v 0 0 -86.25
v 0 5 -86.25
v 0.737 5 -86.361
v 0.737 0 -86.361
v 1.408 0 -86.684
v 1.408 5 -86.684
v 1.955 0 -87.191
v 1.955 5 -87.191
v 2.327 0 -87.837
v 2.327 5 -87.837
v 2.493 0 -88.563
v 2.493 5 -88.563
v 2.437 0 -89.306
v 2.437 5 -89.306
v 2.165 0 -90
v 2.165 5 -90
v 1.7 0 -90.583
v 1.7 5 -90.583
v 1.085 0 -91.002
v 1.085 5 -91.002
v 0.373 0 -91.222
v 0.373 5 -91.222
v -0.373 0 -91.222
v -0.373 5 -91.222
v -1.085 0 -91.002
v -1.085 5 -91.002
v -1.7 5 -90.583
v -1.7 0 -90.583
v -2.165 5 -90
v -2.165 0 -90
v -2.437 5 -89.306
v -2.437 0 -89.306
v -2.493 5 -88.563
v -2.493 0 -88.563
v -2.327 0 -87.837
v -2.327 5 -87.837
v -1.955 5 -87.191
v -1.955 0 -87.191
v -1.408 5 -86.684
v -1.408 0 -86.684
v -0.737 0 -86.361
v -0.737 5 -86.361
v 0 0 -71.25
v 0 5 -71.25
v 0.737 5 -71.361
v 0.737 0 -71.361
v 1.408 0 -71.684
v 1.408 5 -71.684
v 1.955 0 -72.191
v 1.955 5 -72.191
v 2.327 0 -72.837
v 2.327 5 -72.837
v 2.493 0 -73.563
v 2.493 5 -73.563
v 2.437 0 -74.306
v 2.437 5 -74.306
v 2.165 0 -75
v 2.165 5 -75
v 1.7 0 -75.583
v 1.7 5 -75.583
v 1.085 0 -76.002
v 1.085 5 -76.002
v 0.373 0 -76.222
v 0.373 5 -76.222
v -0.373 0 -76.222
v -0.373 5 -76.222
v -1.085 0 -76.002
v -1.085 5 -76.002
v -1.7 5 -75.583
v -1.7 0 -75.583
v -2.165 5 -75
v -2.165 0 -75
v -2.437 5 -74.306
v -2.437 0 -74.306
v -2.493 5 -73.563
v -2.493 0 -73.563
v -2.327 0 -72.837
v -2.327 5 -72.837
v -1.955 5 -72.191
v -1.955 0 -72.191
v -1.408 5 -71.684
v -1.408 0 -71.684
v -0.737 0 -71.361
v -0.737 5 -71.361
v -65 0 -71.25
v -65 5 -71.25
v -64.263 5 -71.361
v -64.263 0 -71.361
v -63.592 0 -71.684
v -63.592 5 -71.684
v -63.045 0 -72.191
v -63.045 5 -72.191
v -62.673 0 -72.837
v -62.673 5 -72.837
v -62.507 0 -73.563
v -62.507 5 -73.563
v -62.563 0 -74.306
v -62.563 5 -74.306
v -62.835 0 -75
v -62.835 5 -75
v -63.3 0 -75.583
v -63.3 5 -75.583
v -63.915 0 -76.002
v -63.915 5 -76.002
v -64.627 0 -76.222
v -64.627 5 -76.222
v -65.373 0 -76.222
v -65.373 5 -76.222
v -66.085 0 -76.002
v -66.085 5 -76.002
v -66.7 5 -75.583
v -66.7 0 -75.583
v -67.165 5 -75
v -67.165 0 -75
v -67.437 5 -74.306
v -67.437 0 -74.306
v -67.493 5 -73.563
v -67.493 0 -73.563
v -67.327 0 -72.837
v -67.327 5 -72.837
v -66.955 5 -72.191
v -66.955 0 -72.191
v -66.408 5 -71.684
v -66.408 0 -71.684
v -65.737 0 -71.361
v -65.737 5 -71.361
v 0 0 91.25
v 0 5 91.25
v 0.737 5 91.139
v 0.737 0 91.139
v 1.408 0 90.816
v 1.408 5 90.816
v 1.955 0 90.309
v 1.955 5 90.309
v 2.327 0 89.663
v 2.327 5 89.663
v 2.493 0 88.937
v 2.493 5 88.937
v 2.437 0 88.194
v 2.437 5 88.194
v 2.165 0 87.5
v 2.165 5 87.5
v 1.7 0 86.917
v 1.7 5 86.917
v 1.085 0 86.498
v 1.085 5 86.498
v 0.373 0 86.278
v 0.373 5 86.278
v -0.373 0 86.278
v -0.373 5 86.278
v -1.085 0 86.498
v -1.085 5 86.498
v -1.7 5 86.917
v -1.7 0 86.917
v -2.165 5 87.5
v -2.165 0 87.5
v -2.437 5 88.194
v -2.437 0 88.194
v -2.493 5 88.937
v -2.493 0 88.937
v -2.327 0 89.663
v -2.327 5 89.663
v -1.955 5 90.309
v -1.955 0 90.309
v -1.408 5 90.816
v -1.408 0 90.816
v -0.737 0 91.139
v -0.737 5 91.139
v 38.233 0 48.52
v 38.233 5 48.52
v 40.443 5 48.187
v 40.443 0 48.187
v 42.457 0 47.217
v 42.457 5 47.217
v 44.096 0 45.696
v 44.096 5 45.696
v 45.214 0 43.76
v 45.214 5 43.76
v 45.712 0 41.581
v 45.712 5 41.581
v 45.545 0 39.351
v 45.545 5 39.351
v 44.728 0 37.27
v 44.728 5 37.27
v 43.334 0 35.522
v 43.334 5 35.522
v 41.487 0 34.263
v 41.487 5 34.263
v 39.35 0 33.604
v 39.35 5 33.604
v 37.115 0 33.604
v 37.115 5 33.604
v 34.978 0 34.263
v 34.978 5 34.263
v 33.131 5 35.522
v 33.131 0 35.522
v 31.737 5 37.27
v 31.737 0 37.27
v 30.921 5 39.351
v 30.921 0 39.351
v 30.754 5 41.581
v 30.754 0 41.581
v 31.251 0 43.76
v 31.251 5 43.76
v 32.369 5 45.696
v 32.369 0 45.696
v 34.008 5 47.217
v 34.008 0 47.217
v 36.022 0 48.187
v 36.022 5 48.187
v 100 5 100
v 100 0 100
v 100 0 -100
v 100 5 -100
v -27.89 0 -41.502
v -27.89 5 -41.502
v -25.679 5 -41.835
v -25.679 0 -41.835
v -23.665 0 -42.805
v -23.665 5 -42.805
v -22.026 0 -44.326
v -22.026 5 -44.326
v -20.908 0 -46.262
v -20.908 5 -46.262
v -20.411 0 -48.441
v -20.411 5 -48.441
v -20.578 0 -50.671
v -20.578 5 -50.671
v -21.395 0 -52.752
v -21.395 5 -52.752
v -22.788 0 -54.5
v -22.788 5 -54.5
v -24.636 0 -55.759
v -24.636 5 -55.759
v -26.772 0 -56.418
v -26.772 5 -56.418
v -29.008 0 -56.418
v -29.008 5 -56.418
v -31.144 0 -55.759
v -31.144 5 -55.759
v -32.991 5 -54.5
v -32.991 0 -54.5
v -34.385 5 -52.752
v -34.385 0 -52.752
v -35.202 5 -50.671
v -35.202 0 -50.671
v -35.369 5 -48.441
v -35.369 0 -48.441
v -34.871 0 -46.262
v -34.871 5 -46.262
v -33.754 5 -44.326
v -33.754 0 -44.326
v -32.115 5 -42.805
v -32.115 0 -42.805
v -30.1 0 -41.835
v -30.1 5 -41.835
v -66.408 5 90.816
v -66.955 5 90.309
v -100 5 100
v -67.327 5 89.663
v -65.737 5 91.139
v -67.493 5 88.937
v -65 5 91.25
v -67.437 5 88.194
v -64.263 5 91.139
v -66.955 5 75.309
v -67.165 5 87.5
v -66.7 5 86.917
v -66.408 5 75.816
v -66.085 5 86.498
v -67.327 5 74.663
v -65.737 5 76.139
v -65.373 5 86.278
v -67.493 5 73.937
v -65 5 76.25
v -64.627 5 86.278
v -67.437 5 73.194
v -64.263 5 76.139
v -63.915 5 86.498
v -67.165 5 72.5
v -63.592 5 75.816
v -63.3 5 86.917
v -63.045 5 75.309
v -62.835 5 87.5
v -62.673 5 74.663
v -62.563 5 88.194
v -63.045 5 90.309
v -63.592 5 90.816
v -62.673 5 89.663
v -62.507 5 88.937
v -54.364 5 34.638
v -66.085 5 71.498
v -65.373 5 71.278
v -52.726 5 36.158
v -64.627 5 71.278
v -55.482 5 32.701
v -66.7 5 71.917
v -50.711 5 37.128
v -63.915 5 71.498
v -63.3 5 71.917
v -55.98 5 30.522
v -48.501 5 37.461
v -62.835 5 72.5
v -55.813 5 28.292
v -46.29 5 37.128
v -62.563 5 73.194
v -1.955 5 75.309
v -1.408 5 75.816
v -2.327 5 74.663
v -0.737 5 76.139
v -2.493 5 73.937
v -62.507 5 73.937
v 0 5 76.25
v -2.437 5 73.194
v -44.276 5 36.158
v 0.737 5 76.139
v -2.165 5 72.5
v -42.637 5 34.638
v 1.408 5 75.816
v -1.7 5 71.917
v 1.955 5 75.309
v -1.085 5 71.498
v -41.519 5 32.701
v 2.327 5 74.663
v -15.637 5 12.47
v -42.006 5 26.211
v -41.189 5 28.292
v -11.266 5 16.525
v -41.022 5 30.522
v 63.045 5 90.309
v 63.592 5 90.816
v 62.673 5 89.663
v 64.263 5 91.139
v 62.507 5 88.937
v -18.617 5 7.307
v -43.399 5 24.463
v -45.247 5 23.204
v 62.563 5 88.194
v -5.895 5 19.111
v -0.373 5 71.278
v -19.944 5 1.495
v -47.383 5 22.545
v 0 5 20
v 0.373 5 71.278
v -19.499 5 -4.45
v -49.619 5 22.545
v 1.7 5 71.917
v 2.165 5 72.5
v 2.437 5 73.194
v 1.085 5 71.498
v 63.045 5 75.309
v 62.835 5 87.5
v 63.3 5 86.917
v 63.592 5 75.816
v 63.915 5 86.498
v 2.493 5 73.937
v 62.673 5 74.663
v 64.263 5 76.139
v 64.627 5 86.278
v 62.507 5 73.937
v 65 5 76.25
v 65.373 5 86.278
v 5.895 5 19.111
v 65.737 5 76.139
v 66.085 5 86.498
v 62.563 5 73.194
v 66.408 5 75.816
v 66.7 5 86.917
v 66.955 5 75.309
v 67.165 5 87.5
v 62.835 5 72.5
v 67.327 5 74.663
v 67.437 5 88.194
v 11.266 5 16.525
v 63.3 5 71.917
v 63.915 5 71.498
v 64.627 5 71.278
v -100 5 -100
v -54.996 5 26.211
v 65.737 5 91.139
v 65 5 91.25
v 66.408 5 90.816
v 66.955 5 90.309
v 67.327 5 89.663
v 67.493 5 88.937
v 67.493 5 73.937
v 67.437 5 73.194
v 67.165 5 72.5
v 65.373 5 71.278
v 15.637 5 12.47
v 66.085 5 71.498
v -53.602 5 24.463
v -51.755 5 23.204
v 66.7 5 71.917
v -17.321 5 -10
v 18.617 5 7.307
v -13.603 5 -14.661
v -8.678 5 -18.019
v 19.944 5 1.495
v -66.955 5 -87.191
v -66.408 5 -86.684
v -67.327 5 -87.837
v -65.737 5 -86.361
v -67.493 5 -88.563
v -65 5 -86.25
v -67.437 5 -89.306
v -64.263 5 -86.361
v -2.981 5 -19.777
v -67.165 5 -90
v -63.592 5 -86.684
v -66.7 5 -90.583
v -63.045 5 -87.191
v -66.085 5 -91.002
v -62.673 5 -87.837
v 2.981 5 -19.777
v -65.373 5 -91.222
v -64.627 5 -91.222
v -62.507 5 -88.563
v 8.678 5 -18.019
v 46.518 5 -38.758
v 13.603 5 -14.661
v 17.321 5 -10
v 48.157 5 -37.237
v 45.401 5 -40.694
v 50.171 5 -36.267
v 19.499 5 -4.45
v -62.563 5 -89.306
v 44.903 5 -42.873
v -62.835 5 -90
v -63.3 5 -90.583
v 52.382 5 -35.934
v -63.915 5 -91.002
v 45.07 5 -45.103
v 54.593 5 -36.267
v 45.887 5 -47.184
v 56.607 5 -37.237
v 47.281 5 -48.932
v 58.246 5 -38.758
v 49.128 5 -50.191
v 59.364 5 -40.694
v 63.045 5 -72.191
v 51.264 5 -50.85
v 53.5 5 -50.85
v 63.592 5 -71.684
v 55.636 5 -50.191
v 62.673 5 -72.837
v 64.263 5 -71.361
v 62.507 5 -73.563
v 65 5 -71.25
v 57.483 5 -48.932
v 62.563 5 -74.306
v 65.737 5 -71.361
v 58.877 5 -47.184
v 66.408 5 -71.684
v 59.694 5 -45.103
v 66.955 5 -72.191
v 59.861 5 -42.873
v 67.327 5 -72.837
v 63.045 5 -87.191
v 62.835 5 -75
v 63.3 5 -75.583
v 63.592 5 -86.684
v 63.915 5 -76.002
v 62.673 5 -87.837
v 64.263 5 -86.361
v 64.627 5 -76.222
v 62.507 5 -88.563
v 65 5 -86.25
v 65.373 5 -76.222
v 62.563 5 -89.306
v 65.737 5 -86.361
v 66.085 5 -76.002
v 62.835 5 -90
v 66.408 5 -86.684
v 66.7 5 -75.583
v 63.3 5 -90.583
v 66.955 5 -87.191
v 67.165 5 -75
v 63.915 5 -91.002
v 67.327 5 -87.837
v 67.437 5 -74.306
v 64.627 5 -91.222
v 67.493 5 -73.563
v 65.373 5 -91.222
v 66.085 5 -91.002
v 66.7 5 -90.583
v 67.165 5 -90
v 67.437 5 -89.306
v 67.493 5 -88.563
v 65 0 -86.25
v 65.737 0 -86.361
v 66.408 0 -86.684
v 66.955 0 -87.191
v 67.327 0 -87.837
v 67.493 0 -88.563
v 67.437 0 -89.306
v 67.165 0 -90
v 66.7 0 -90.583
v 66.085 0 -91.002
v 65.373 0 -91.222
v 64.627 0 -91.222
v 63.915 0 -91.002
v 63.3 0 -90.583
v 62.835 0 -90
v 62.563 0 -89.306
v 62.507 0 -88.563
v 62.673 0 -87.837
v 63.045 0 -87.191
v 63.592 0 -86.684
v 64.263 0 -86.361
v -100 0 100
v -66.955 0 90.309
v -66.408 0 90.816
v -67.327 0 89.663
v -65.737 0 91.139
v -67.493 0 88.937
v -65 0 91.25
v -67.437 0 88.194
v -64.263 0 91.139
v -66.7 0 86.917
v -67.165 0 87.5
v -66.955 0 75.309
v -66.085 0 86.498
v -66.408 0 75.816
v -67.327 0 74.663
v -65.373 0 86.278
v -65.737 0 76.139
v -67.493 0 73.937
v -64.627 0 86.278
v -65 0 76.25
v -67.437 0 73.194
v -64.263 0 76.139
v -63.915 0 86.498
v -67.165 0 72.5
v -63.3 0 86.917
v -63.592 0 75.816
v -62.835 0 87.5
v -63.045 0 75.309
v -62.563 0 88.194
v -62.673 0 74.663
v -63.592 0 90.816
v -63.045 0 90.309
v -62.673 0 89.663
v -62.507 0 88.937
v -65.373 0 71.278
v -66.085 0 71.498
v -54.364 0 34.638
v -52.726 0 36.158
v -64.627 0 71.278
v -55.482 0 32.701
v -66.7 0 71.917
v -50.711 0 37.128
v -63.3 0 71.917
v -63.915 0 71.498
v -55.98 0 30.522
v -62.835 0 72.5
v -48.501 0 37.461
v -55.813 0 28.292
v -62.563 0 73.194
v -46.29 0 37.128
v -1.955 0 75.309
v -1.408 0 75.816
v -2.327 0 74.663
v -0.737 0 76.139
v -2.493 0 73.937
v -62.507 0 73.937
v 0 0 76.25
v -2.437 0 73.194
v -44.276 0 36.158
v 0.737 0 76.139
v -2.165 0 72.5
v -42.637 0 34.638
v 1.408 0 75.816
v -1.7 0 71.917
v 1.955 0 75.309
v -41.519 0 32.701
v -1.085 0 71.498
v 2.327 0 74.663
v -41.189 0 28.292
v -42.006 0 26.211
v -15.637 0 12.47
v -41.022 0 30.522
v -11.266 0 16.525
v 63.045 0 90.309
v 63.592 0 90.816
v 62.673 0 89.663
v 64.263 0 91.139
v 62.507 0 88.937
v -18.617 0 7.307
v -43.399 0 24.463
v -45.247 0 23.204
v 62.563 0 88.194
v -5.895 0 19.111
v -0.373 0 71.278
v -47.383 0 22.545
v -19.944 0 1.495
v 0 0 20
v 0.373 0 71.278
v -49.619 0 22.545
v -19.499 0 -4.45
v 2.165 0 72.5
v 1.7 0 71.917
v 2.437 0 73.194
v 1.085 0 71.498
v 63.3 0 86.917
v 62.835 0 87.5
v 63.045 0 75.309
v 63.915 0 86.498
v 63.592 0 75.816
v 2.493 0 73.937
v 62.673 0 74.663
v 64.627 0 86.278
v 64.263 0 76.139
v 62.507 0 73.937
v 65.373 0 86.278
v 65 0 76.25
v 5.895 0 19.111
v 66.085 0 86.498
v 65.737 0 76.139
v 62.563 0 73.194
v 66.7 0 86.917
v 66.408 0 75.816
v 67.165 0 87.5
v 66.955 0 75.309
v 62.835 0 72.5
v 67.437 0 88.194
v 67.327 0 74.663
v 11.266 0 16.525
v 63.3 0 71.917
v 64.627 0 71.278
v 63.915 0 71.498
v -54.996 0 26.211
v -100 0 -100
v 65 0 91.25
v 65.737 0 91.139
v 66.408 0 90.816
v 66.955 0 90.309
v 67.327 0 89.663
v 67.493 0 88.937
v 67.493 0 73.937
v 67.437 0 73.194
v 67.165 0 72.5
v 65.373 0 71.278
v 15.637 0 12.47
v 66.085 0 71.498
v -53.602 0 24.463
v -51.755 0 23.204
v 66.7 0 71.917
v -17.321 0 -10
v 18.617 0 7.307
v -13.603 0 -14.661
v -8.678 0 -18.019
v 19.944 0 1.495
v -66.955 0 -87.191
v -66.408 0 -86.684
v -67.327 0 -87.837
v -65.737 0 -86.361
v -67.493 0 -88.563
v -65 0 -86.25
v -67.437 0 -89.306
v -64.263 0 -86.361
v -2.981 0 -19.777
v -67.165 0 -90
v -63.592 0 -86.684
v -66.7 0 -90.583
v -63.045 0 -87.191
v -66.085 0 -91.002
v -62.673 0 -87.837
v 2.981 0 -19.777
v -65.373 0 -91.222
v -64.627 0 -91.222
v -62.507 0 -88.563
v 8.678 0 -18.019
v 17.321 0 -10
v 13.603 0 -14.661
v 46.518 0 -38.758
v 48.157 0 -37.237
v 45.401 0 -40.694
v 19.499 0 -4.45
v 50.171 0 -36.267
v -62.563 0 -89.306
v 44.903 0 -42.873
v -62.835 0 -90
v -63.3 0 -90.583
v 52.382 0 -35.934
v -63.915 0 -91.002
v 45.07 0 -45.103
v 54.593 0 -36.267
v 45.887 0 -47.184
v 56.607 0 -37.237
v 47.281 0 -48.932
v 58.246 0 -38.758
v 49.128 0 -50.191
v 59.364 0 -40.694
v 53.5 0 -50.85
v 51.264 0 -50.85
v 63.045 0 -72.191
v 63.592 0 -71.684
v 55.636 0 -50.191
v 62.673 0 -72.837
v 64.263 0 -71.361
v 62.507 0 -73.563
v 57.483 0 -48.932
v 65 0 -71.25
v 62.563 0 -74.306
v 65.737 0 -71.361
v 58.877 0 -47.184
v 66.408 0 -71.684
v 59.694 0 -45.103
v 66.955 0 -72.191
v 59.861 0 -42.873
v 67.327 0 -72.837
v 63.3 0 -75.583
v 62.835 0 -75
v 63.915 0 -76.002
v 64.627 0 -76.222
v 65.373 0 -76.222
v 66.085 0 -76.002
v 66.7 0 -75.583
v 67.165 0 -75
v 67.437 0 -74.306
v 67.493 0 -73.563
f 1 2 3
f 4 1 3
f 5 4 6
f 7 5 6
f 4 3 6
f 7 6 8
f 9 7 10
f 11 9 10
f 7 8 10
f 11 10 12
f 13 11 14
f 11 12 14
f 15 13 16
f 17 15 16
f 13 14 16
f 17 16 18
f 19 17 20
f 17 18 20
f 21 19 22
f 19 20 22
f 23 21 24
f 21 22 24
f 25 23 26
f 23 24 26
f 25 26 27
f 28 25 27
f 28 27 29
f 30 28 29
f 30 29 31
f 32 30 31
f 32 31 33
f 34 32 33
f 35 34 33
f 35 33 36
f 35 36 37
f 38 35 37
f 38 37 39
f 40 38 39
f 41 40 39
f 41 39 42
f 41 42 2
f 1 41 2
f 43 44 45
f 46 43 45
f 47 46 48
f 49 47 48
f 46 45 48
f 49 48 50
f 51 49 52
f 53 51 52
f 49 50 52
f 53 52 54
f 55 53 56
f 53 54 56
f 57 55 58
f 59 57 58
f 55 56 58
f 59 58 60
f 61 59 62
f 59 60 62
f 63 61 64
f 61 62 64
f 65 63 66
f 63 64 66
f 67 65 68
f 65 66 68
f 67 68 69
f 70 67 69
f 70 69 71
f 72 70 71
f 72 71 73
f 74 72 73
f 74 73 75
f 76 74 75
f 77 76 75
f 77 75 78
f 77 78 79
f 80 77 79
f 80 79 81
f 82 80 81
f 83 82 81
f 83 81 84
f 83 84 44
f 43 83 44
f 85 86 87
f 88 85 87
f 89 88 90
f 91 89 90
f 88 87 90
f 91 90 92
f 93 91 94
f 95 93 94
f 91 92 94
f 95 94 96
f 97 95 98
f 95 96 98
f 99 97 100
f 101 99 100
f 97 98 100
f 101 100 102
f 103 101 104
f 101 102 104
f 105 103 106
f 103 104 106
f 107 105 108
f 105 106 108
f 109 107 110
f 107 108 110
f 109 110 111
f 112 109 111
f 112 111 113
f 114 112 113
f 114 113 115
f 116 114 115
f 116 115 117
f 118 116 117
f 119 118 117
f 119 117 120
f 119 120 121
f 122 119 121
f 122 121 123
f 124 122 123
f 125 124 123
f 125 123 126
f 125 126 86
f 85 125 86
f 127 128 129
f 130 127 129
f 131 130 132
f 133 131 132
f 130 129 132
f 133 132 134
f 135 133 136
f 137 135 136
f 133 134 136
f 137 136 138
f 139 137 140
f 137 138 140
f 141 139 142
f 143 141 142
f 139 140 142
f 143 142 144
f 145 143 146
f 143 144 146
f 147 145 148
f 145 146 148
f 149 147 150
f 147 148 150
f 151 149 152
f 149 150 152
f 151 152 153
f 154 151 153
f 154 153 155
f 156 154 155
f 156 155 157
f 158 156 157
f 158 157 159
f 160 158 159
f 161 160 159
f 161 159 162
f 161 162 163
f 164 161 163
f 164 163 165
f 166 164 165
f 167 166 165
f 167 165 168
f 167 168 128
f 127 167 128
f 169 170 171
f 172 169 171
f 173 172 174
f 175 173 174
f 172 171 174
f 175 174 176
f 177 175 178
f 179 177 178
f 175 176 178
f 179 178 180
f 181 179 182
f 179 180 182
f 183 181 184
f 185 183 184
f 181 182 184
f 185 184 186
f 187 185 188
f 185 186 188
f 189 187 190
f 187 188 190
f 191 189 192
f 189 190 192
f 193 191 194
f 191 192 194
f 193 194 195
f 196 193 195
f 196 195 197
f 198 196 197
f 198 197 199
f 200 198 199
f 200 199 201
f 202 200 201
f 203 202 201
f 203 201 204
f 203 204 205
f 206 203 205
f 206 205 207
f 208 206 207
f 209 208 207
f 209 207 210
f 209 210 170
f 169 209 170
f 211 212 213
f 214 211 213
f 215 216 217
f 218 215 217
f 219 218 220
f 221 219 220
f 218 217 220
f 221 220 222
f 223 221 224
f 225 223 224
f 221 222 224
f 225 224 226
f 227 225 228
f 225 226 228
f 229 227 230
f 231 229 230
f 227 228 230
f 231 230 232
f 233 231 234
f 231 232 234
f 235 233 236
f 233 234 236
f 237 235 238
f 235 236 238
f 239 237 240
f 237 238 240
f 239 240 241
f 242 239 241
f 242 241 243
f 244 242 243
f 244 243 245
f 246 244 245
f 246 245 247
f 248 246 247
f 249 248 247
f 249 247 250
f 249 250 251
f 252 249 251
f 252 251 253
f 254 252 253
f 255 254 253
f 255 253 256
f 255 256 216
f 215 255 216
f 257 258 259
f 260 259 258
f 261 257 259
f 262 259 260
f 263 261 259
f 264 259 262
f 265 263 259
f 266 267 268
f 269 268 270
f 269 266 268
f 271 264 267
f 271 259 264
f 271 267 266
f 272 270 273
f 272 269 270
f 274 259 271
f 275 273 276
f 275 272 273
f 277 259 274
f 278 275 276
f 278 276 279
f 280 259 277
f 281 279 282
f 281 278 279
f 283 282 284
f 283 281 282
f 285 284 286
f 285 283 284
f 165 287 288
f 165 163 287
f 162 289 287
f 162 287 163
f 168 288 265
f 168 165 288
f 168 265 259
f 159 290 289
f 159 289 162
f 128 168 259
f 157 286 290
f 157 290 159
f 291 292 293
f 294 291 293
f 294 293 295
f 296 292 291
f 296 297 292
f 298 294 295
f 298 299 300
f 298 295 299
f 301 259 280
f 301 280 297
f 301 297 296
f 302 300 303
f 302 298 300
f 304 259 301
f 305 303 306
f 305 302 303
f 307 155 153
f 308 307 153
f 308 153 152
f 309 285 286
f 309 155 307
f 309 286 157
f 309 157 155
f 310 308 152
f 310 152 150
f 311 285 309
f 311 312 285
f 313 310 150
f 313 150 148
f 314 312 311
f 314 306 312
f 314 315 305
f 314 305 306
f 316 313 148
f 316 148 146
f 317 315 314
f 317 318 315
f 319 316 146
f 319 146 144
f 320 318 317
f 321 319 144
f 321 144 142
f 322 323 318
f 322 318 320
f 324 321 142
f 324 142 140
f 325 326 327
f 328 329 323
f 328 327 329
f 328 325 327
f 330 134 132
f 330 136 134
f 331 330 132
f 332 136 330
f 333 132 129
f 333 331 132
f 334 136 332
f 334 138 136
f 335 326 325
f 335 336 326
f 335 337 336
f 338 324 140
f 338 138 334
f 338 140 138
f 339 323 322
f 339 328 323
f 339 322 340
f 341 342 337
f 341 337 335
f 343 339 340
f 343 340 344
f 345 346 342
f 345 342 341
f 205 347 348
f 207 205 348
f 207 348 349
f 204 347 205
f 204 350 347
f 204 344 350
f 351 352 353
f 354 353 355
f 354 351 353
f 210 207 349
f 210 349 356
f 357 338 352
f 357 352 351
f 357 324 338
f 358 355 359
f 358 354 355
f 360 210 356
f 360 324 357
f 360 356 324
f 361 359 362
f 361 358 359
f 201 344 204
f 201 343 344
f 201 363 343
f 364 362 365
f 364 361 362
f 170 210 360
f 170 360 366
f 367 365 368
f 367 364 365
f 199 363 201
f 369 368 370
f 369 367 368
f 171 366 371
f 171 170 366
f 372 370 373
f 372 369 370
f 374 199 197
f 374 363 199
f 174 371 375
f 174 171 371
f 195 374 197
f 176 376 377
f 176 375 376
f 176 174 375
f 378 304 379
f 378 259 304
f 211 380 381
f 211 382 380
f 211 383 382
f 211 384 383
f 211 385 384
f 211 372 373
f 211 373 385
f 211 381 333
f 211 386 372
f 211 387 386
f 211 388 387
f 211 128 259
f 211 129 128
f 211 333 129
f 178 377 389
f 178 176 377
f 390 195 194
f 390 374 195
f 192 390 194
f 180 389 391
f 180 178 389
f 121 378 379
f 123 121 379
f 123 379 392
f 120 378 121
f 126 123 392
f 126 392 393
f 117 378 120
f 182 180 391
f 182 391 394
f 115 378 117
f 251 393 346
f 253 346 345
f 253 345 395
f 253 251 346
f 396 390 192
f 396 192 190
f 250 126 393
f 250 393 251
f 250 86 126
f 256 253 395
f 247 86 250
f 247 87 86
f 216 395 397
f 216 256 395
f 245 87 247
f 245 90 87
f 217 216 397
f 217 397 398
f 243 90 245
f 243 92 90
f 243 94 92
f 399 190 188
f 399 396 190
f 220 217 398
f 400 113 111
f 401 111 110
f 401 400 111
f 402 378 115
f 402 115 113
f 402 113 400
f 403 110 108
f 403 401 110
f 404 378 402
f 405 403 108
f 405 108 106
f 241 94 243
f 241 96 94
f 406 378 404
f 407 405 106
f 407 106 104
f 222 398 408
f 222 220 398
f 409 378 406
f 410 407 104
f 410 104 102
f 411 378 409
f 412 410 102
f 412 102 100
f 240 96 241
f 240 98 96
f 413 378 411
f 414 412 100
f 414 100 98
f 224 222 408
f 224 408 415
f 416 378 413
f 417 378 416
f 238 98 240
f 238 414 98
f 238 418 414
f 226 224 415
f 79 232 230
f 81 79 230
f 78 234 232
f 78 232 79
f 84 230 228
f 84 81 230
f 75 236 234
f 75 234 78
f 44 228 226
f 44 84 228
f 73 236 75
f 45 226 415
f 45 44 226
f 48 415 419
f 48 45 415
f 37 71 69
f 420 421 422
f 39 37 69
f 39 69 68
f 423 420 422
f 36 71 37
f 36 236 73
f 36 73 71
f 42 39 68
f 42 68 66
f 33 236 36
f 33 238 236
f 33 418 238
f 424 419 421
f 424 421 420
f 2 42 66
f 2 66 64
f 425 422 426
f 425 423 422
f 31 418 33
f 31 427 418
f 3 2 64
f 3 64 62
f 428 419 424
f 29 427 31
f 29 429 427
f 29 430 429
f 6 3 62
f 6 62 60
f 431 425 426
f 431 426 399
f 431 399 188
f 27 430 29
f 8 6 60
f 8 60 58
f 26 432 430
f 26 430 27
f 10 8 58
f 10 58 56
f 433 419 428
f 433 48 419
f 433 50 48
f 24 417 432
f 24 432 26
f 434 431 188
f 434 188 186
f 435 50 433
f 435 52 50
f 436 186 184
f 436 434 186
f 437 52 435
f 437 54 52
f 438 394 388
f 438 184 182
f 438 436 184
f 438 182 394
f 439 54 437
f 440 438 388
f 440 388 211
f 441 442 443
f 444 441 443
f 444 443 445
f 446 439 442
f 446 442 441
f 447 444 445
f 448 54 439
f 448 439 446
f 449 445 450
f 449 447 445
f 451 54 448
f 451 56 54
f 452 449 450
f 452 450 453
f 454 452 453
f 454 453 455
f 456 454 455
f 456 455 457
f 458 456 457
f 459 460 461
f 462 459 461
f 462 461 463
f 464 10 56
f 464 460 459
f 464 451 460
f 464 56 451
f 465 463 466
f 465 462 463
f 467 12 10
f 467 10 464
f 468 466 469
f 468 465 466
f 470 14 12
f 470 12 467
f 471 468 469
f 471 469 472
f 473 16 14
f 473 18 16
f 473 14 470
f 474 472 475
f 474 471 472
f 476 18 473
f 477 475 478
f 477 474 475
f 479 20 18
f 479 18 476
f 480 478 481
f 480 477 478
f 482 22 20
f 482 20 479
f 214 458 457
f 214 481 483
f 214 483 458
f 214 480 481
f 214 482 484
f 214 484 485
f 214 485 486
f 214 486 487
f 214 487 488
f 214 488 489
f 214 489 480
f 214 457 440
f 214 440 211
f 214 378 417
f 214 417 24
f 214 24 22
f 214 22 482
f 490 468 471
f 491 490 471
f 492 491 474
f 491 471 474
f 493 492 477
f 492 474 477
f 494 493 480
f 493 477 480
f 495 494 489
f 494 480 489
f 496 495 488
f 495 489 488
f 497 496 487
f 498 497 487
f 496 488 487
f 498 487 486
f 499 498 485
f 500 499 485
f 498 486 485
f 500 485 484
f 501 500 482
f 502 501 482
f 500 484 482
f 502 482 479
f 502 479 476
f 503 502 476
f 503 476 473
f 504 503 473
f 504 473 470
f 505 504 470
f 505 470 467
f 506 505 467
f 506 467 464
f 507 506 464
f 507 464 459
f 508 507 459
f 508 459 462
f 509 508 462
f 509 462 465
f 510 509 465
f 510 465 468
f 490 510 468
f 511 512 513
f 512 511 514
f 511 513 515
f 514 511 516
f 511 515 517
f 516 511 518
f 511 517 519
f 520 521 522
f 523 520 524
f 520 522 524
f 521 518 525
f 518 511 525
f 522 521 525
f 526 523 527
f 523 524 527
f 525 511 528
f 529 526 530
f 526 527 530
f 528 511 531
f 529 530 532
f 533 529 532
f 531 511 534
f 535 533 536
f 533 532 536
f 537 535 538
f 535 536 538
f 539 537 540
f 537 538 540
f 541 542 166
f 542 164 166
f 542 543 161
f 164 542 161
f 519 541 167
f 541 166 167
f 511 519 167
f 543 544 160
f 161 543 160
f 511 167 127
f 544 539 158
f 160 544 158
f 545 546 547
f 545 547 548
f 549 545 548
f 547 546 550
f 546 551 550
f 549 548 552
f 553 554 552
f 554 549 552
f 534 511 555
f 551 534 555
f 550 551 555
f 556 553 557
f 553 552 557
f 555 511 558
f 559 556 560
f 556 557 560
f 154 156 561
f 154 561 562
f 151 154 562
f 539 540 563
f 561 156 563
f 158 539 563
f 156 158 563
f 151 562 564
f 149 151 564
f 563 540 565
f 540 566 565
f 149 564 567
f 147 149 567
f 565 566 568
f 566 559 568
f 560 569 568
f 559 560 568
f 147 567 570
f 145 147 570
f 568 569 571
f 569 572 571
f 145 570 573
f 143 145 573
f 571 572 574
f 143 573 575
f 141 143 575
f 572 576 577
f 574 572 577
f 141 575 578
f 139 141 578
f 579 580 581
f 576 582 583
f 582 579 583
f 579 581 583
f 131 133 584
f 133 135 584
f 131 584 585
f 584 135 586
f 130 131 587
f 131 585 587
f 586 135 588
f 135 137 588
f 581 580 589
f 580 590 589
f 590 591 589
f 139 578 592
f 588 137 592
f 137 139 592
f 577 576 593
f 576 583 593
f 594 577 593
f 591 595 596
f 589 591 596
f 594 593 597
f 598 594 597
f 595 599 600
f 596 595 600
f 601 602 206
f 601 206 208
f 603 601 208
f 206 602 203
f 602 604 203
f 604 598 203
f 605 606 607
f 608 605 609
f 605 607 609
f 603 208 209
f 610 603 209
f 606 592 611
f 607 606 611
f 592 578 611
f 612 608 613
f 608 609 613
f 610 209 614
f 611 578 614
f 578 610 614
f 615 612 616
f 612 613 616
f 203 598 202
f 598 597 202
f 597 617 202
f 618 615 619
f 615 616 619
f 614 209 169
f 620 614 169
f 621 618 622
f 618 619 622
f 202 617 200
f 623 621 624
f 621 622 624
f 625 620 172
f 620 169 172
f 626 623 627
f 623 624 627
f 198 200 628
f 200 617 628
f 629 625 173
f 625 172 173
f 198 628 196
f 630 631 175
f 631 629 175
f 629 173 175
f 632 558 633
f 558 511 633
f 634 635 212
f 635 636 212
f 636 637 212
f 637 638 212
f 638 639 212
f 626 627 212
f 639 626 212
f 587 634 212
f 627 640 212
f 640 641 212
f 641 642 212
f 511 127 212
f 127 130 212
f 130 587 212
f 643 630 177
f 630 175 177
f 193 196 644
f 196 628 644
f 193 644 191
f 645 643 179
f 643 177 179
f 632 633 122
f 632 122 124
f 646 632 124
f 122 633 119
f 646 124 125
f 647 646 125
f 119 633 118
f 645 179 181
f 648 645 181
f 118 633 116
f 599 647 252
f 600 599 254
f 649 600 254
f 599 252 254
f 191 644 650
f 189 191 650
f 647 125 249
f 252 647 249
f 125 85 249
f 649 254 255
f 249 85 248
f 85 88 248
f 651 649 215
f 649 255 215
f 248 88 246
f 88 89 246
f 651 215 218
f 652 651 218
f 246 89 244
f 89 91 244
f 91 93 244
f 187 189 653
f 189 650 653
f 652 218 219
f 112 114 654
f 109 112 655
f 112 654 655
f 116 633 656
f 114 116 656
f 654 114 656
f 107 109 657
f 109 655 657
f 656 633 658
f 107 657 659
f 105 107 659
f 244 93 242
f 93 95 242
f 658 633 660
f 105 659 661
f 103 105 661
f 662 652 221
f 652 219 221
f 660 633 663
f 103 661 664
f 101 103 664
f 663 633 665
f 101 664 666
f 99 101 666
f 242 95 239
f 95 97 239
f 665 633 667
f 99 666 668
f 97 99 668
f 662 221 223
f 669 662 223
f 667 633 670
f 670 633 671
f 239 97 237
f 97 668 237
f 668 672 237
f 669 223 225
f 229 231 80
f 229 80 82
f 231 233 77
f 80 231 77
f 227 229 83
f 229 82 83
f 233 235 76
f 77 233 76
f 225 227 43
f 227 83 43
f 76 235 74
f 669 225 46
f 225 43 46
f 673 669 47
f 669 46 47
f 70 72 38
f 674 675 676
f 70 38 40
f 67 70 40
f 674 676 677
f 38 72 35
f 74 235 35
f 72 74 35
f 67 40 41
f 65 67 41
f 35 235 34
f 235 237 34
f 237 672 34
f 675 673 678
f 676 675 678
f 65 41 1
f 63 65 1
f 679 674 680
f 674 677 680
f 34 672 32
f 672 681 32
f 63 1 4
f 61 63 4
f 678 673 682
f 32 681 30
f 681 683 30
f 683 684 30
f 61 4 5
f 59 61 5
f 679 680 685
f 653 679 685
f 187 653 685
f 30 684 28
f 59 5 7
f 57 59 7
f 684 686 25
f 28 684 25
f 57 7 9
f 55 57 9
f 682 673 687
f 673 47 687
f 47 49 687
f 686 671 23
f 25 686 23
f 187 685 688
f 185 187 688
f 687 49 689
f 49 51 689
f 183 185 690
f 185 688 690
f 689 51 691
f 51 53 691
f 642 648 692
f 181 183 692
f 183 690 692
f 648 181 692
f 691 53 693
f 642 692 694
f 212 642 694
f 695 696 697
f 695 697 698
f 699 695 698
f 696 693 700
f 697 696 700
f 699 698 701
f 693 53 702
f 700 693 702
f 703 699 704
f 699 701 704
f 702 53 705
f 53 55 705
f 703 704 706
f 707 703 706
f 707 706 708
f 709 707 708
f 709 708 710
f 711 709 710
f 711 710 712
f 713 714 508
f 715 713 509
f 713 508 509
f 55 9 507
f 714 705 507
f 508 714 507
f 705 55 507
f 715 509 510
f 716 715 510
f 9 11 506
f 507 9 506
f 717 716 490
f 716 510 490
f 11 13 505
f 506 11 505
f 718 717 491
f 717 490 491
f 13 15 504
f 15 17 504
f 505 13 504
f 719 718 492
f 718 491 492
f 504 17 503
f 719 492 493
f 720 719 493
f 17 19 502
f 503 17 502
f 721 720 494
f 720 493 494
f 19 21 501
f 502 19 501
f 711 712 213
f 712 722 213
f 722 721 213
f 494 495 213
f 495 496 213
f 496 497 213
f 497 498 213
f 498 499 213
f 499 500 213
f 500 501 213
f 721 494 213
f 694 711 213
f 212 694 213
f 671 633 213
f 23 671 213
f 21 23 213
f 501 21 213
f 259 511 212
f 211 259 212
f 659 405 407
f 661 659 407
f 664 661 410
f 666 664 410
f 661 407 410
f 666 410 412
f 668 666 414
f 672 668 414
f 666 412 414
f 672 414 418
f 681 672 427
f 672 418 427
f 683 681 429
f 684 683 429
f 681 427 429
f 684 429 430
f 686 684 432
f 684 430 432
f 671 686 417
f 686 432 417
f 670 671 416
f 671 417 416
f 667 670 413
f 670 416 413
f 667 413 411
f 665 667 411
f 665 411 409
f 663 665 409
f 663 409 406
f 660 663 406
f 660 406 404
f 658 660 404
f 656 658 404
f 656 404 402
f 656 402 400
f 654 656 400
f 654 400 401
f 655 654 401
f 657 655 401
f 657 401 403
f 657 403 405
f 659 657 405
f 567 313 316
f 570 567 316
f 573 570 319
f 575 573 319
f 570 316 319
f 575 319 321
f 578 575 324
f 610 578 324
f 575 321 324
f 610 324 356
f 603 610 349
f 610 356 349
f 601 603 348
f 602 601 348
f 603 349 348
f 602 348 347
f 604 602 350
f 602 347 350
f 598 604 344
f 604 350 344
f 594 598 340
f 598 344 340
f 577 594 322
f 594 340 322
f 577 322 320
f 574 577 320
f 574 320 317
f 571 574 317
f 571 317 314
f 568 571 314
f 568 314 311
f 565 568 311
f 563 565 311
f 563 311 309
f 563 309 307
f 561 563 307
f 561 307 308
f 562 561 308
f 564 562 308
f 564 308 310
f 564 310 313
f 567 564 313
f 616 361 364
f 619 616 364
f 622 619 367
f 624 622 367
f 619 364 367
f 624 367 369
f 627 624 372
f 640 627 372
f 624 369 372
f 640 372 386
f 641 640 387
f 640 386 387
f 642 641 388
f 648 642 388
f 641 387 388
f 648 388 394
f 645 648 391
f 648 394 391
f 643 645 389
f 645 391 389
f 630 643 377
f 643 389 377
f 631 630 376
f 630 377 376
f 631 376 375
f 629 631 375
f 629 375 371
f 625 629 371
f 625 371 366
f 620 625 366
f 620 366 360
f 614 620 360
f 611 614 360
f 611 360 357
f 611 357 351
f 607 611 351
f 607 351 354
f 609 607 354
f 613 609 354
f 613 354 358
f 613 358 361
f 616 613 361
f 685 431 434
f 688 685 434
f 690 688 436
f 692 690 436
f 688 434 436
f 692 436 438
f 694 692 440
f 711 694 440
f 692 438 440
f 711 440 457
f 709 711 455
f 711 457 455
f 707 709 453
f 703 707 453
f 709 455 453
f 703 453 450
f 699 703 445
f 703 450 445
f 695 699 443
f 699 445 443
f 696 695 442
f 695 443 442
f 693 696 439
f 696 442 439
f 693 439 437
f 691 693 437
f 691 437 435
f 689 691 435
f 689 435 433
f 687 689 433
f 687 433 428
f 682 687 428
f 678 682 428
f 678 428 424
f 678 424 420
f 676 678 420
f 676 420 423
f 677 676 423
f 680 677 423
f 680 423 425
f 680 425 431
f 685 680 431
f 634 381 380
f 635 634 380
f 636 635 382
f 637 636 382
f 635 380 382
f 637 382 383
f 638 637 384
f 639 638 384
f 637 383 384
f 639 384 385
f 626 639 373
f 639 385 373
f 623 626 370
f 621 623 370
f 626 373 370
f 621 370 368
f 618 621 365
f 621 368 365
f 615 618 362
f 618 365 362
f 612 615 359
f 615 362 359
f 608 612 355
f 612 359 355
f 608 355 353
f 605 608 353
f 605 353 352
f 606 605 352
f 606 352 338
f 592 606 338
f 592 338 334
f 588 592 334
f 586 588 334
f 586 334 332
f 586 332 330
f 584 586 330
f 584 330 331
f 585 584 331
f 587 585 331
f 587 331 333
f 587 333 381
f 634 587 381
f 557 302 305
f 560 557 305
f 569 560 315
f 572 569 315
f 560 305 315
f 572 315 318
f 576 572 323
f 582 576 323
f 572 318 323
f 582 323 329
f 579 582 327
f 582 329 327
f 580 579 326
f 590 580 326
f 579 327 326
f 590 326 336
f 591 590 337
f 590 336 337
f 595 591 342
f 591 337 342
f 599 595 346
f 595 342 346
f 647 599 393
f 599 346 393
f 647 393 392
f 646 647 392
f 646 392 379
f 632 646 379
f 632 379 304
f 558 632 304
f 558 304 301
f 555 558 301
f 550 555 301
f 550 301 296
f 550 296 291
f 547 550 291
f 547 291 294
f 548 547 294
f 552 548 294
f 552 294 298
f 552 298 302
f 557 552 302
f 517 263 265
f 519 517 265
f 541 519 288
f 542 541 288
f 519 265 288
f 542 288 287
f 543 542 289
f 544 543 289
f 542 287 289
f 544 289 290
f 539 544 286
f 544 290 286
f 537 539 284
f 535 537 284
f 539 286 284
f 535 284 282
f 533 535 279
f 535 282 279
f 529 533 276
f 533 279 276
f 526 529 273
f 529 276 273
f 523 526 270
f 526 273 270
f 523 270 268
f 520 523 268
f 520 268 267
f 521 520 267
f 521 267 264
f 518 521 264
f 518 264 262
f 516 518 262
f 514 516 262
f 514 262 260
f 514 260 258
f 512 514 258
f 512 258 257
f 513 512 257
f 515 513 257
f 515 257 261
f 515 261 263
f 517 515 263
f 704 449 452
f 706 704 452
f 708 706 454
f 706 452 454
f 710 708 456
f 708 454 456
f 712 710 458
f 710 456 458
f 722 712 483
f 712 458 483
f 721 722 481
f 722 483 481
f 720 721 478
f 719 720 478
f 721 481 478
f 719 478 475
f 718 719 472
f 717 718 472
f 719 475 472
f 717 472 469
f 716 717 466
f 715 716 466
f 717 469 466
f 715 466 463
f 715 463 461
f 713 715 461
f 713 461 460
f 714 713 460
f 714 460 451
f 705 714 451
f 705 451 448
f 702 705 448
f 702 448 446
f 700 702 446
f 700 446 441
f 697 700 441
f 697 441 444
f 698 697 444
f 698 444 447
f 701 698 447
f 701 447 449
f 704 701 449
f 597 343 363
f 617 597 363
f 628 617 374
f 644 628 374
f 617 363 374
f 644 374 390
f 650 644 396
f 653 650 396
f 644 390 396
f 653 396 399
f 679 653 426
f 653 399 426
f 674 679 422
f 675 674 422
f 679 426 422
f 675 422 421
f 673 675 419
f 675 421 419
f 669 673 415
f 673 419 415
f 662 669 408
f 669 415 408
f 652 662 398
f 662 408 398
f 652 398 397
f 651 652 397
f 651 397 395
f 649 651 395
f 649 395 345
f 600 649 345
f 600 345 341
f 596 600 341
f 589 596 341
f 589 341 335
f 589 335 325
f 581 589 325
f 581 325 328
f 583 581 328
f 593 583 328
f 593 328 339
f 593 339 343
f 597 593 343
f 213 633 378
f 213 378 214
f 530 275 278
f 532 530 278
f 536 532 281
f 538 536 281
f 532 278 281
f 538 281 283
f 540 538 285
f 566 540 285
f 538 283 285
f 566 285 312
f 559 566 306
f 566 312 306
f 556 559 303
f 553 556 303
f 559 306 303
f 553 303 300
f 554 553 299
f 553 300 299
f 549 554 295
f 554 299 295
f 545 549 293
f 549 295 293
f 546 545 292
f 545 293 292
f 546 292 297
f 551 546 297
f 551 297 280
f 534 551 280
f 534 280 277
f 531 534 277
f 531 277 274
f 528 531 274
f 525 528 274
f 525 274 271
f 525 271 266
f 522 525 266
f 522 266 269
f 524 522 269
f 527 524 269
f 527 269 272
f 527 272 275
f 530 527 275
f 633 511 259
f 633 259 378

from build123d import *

# Parameters (mm, degrees)
SKETCH2_W              = 200
SKETCH2_H              = 200
BOSS_EXTRUDE1_DEPTH    = 5
SKETCH3_W              = 5
SKETCH3_H              = 30
BOSS_EXTRUDE2_DEPTH    = 60
CUT_EXTRUDE1_REACH     = 189.75
SKETCH4_R              = 5
FILLET1_R              = 10
LPATTERN1_COUNT        = 3
LPATTERN1_PITCH        = 57.5
LPATTERN1_COUNT_DIR2   = 2
LPATTERN1_PITCH_DIR2   = 136.25
FILLET1_OF_LPATTERN1_R = 10
SKETCH6_R              = 20
CUT_EXTRUDE3_DEPTH     = 154.622914957
SKETCH10_R             = 2.5
CUT_EXTRUDE4_DEPTH     = 154.622914957
LPATTERN2_COUNT        = 3
LPATTERN2_PITCH        = 65
LPATTERN2_COUNT_DIR2   = 2
LPATTERN2_PITCH_DIR2   = 162.5
SKETCH11_W             = 200
SKETCH11_H             = 200
CUT_EXTRUDE5_DEPTH     = 154.622914957
SKETCH12_R             = 7.5
CUT_EXTRUDE6_DEPTH     = 142.509716981


with BuildPart() as part:
    # Sketch2 → Boss-Extrude1 (new body)
    with BuildSketch(Plane(origin=(0, 0, 0), x_dir=(1, 0, 0), z_dir=(0, 1, 0))):
        Rectangle(SKETCH2_W, SKETCH2_H)
    extrude(amount=BOSS_EXTRUDE1_DEPTH)

    # Sketch3 → Boss-Extrude2 (add)
    with BuildSketch(Plane(origin=(0, 5, 0), x_dir=(1, 0, 0), z_dir=(0, 1, 0))):
        with Locations((-82.5, 81.25)):
            Rectangle(SKETCH3_W, SKETCH3_H)
        with Locations((-47.5, 81.25)):
            Rectangle(SKETCH3_W, SKETCH3_H)
    boss_extrude2 = extrude(amount=BOSS_EXTRUDE2_DEPTH)

    # Cut-Extrude1: up to this face of the body (flat: up to its plane)
    cut_extrude1_end = Plane(part.part.faces().sort_by_distance((-85, 35, -81.25))[0])
    # Sketch4 → Cut-Extrude1 (cut, up to the picked face)
    with BuildSketch(Plane(origin=(-45, 0, 0), x_dir=(0, 0, -1), z_dir=(1, 0, 0)), mode=Mode.PRIVATE) as cut_extrude1_sk1:
        with Locations((81.25, 55)):
            Circle(SKETCH4_R)
    cut_extrude1_tool1 = split(extrude(cut_extrude1_sk1.sketch, amount=-CUT_EXTRUDE1_REACH, mode=Mode.PRIVATE), bisect_by=cut_extrude1_end, keep=Keep.BOTH, mode=Mode.PRIVATE)
    cut_extrude1 = cut_extrude1_tool1.solids().sort_by(Axis((-45, 55, -81.25), (-1, 0, 0)))[0]
    add(cut_extrude1, mode=Mode.SUBTRACT)

    # Fillet1
    fillet1_edges = [part.edges().sort_by_distance(p)[0] for p in [
        (-82.5, 65, -96.25),
        (-82.5, 65, -66.25),
        (-47.5, 65, -96.25),
        (-47.5, 65, -66.25),
    ]]
    fillet(fillet1_edges, radius=FILLET1_R)

    # LPattern1: Boss-Extrude2, Cut-Extrude1 3 × 2
    with Locations(*[(i * LPATTERN1_PITCH, 0, j * LPATTERN1_PITCH_DIR2) for i in range(LPATTERN1_COUNT) for j in range(LPATTERN1_COUNT_DIR2) if (i, j) != (0, 0)]):
        add(boss_extrude2)
        add(cut_extrude1, mode=Mode.SUBTRACT)

    # Fillet1 of LPattern1
    fillet1_of_lpattern1_edges = [part.edges().sort_by_distance(p)[0] for p in [
        (-82.5, 65, 40),
        (-82.5, 65, 70),
        (-47.5, 65, 40),
        (-47.5, 65, 70),
        (-25, 65, -96.25),
        (-25, 65, -66.25),
        (10, 65, -96.25),
        (10, 65, -66.25),
        (-25, 65, 40),
        (-25, 65, 70),
        (10, 65, 40),
        (10, 65, 70),
        (32.5, 65, -96.25),
        (32.5, 65, -66.25),
        (67.5, 65, -96.25),
        (67.5, 65, -66.25),
        (32.5, 65, 40),
        (32.5, 65, 70),
        (67.5, 65, 40),
        (67.5, 65, 70),
    ]]
    fillet(fillet1_of_lpattern1_edges, radius=FILLET1_OF_LPATTERN1_R)

    # Sketch6 → Cut-Extrude3 (cut, through all)
    with BuildSketch(Plane(origin=(0, 5, 0), x_dir=(1, 0, 0), z_dir=(0, 1, 0))):
        with Locations(Location((0, 0, 0), (0, 0, 270))):
            Circle(SKETCH6_R)
    extrude(amount=-CUT_EXTRUDE3_DEPTH, mode=Mode.SUBTRACT)

    # Sketch10 → Cut-Extrude4 (cut, through all)
    with BuildSketch(Plane(origin=(0, 5, 0), x_dir=(1, 0, 0), z_dir=(0, 1, 0))):
        with Locations(Location((-65, 88.75, 0), (0, 0, 270))):
            Circle(SKETCH10_R)
        with Locations(Location((-65, 73.75, 0), (0, 0, 270))):
            Circle(SKETCH10_R)
    cut_extrude4 = extrude(amount=-CUT_EXTRUDE4_DEPTH, mode=Mode.SUBTRACT)

    # LPattern2: Cut-Extrude4 3 × 2
    with Locations(*[(i * LPATTERN2_PITCH, 0, j * LPATTERN2_PITCH_DIR2) for i in range(LPATTERN2_COUNT) for j in range(LPATTERN2_COUNT_DIR2) if (i, j) != (0, 0)]):
        add(cut_extrude4, mode=Mode.SUBTRACT)

    # Sketch11 → Cut-Extrude5 (cut, through all)
    with BuildSketch(Plane(origin=(0, 5, 0), x_dir=(1, 0, 0), z_dir=(0, 1, 0))):
        Rectangle(SKETCH11_W, SKETCH11_H)
    extrude(amount=CUT_EXTRUDE5_DEPTH, mode=Mode.SUBTRACT)

    # Sketch12 → Cut-Extrude6 (cut, through all)
    with BuildSketch(Plane(origin=(0, 5, 0), x_dir=(1, 0, 0), z_dir=(0, 1, 0))):
        with Locations(Location((-27.889795318, 49.001974117, 0), (0, 0, 270))):
            Circle(SKETCH12_R)
        with Locations(Location((-48.500694077, -29.961353007, 0), (0, 0, 270))):
            Circle(SKETCH12_R)
        with Locations(Location((38.23257582, -41.020077289, 0), (0, 0, 270))):
            Circle(SKETCH12_R)
        with Locations(Location((52.382098498, 43.433800873, 0), (0, 0, 270))):
            Circle(SKETCH12_R)
    extrude(amount=-CUT_EXTRUDE6_DEPTH, mode=Mode.SUBTRACT)


solid = part.part
